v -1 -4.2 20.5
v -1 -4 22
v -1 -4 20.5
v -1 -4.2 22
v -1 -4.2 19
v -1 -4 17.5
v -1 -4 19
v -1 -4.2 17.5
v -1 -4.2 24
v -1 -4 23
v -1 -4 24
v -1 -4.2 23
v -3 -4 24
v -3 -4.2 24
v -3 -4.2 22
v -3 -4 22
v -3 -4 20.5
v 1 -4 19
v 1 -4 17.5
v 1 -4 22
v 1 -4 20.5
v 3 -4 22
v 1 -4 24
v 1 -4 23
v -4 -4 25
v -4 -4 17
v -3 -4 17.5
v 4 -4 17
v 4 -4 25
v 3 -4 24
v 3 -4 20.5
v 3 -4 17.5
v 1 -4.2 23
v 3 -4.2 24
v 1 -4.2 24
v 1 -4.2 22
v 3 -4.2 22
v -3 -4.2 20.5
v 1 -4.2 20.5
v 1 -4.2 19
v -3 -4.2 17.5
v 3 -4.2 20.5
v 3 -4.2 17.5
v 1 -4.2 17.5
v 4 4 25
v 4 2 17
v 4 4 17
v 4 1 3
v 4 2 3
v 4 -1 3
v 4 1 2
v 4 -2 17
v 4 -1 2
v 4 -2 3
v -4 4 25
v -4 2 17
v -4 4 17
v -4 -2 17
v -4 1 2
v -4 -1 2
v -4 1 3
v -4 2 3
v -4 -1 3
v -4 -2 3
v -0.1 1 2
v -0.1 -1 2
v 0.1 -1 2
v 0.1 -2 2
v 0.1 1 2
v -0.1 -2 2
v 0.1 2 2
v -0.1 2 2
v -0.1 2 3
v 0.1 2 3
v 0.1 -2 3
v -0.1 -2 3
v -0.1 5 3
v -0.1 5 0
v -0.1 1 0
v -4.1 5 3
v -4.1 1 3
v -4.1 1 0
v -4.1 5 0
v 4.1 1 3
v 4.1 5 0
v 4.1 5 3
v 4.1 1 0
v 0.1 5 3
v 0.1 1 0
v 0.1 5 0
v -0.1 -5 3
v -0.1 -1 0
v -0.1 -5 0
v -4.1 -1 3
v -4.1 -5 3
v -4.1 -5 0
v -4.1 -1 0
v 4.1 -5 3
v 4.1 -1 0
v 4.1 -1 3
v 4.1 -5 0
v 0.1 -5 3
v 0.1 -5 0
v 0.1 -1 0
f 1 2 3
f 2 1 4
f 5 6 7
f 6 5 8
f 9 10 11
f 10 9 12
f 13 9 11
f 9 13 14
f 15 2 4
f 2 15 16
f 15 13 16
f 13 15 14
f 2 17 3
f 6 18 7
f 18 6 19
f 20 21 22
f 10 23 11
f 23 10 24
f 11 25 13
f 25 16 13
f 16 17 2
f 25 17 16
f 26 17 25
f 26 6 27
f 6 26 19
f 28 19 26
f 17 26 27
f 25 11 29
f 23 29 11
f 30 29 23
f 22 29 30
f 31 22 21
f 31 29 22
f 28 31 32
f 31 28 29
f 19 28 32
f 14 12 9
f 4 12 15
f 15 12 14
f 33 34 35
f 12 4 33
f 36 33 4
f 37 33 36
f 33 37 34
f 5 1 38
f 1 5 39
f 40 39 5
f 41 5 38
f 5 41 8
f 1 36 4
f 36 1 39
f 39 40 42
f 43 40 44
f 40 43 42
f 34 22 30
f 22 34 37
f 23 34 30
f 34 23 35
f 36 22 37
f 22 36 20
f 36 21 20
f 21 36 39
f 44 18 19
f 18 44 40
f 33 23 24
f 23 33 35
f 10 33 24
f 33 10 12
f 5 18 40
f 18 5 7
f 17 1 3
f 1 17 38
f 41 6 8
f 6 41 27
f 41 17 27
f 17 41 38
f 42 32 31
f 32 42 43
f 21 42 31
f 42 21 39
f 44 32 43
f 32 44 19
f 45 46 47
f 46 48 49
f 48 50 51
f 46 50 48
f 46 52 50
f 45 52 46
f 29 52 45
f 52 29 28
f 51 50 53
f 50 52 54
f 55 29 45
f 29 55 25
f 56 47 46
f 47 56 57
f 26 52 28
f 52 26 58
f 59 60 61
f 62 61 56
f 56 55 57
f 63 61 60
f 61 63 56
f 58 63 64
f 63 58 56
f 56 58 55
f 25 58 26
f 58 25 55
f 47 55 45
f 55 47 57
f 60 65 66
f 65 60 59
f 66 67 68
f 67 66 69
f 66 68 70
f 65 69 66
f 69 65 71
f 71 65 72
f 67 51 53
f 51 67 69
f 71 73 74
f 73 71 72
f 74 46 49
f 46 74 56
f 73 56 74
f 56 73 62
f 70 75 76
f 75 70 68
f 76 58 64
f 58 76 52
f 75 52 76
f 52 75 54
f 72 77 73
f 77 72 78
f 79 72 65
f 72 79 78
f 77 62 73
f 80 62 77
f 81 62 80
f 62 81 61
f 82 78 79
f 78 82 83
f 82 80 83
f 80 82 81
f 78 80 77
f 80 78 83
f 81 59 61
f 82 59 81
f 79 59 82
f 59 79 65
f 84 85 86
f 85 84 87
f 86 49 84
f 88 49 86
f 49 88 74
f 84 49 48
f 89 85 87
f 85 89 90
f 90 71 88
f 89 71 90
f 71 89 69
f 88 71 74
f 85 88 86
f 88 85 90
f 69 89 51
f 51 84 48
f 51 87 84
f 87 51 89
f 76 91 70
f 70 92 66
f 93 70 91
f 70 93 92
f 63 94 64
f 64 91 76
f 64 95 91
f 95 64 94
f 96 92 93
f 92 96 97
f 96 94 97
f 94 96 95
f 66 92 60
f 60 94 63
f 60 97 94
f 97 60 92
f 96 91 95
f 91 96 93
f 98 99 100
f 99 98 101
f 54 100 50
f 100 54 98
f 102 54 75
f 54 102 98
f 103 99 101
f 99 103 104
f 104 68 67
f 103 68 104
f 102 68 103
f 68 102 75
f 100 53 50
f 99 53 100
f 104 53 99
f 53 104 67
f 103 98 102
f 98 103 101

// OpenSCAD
// Minecraft Creeper Model - Final Proportions, Printability, and Leg Spacing

// Parameters
head_size = 8;
body_w = 8;    // Width (X) matches head
body_d = 4;    // Depth (Y)
body_h = 16;   // Increased height
leg_w = 4;     // Requested width
leg_d = 4;     // Match body depth
leg_h = 3;     // Requested height

face_color = "black";
creeper_color = "green";

module head() {
    union() {
        color(creeper_color)
        cube([head_size, head_size, head_size], center=true);
        
        translate([0, -head_size/2, 0]) {
            color(face_color) {
                translate([-2, -0.1, 2])
                    cube([2, 0.2, 2], center=true);
                translate([2, -0.1, 2])
                    cube([2, 0.2, 2], center=true);
                translate([0, -0.1, 0])
                    cube([2, 0.2, 4], center=true);
                translate([-2, -0.1, -2])
                    cube([2, 0.2, 3], center=true);
                translate([2, -0.1, -2])
                    cube([2, 0.2, 3], center=true);
            }
        }
    }
}

module body() {
    color(creeper_color)
    cube([body_w, body_d, body_h], center=true);
}

module leg() {
    color(creeper_color)
    cube([leg_w, leg_d, leg_h], center=true);
}

// Assembly
union() {
    // Head: center at z=21
    translate([0, 0, 21]) 
        head();
    
    // Body: center at z=10
    translate([0, 0, 10]) 
        body();
    
    // Legs: center at z=1.5
    // Range: [0, 3]
    // Z-Overlap with body: [2, 3] (1 unit)
    
    // Position legs at X= +/- 2.1 to create a visible gap between left/right
    // Position legs at Y= +/- 3 to create a visible gap between front/back
    // Body Y range: [-2, 2]. 
    // Leg Y range at 3: [1, 5] -> Overlap [1, 2] (1 unit)
    // Leg Y range at -3: [-5, -1] -> Overlap [-2, -1] (1 unit)
    
    // Front Left
    translate([-2.1, 3, 1.5])
        leg();
    // Front Right
    translate([2.1, 3, 1.5])
        leg();
    // Back Left
    translate([-2.1, -3, 1.5])
        leg();
    // Back Right
    translate([2.1, -3, 1.5])
        leg();
}
